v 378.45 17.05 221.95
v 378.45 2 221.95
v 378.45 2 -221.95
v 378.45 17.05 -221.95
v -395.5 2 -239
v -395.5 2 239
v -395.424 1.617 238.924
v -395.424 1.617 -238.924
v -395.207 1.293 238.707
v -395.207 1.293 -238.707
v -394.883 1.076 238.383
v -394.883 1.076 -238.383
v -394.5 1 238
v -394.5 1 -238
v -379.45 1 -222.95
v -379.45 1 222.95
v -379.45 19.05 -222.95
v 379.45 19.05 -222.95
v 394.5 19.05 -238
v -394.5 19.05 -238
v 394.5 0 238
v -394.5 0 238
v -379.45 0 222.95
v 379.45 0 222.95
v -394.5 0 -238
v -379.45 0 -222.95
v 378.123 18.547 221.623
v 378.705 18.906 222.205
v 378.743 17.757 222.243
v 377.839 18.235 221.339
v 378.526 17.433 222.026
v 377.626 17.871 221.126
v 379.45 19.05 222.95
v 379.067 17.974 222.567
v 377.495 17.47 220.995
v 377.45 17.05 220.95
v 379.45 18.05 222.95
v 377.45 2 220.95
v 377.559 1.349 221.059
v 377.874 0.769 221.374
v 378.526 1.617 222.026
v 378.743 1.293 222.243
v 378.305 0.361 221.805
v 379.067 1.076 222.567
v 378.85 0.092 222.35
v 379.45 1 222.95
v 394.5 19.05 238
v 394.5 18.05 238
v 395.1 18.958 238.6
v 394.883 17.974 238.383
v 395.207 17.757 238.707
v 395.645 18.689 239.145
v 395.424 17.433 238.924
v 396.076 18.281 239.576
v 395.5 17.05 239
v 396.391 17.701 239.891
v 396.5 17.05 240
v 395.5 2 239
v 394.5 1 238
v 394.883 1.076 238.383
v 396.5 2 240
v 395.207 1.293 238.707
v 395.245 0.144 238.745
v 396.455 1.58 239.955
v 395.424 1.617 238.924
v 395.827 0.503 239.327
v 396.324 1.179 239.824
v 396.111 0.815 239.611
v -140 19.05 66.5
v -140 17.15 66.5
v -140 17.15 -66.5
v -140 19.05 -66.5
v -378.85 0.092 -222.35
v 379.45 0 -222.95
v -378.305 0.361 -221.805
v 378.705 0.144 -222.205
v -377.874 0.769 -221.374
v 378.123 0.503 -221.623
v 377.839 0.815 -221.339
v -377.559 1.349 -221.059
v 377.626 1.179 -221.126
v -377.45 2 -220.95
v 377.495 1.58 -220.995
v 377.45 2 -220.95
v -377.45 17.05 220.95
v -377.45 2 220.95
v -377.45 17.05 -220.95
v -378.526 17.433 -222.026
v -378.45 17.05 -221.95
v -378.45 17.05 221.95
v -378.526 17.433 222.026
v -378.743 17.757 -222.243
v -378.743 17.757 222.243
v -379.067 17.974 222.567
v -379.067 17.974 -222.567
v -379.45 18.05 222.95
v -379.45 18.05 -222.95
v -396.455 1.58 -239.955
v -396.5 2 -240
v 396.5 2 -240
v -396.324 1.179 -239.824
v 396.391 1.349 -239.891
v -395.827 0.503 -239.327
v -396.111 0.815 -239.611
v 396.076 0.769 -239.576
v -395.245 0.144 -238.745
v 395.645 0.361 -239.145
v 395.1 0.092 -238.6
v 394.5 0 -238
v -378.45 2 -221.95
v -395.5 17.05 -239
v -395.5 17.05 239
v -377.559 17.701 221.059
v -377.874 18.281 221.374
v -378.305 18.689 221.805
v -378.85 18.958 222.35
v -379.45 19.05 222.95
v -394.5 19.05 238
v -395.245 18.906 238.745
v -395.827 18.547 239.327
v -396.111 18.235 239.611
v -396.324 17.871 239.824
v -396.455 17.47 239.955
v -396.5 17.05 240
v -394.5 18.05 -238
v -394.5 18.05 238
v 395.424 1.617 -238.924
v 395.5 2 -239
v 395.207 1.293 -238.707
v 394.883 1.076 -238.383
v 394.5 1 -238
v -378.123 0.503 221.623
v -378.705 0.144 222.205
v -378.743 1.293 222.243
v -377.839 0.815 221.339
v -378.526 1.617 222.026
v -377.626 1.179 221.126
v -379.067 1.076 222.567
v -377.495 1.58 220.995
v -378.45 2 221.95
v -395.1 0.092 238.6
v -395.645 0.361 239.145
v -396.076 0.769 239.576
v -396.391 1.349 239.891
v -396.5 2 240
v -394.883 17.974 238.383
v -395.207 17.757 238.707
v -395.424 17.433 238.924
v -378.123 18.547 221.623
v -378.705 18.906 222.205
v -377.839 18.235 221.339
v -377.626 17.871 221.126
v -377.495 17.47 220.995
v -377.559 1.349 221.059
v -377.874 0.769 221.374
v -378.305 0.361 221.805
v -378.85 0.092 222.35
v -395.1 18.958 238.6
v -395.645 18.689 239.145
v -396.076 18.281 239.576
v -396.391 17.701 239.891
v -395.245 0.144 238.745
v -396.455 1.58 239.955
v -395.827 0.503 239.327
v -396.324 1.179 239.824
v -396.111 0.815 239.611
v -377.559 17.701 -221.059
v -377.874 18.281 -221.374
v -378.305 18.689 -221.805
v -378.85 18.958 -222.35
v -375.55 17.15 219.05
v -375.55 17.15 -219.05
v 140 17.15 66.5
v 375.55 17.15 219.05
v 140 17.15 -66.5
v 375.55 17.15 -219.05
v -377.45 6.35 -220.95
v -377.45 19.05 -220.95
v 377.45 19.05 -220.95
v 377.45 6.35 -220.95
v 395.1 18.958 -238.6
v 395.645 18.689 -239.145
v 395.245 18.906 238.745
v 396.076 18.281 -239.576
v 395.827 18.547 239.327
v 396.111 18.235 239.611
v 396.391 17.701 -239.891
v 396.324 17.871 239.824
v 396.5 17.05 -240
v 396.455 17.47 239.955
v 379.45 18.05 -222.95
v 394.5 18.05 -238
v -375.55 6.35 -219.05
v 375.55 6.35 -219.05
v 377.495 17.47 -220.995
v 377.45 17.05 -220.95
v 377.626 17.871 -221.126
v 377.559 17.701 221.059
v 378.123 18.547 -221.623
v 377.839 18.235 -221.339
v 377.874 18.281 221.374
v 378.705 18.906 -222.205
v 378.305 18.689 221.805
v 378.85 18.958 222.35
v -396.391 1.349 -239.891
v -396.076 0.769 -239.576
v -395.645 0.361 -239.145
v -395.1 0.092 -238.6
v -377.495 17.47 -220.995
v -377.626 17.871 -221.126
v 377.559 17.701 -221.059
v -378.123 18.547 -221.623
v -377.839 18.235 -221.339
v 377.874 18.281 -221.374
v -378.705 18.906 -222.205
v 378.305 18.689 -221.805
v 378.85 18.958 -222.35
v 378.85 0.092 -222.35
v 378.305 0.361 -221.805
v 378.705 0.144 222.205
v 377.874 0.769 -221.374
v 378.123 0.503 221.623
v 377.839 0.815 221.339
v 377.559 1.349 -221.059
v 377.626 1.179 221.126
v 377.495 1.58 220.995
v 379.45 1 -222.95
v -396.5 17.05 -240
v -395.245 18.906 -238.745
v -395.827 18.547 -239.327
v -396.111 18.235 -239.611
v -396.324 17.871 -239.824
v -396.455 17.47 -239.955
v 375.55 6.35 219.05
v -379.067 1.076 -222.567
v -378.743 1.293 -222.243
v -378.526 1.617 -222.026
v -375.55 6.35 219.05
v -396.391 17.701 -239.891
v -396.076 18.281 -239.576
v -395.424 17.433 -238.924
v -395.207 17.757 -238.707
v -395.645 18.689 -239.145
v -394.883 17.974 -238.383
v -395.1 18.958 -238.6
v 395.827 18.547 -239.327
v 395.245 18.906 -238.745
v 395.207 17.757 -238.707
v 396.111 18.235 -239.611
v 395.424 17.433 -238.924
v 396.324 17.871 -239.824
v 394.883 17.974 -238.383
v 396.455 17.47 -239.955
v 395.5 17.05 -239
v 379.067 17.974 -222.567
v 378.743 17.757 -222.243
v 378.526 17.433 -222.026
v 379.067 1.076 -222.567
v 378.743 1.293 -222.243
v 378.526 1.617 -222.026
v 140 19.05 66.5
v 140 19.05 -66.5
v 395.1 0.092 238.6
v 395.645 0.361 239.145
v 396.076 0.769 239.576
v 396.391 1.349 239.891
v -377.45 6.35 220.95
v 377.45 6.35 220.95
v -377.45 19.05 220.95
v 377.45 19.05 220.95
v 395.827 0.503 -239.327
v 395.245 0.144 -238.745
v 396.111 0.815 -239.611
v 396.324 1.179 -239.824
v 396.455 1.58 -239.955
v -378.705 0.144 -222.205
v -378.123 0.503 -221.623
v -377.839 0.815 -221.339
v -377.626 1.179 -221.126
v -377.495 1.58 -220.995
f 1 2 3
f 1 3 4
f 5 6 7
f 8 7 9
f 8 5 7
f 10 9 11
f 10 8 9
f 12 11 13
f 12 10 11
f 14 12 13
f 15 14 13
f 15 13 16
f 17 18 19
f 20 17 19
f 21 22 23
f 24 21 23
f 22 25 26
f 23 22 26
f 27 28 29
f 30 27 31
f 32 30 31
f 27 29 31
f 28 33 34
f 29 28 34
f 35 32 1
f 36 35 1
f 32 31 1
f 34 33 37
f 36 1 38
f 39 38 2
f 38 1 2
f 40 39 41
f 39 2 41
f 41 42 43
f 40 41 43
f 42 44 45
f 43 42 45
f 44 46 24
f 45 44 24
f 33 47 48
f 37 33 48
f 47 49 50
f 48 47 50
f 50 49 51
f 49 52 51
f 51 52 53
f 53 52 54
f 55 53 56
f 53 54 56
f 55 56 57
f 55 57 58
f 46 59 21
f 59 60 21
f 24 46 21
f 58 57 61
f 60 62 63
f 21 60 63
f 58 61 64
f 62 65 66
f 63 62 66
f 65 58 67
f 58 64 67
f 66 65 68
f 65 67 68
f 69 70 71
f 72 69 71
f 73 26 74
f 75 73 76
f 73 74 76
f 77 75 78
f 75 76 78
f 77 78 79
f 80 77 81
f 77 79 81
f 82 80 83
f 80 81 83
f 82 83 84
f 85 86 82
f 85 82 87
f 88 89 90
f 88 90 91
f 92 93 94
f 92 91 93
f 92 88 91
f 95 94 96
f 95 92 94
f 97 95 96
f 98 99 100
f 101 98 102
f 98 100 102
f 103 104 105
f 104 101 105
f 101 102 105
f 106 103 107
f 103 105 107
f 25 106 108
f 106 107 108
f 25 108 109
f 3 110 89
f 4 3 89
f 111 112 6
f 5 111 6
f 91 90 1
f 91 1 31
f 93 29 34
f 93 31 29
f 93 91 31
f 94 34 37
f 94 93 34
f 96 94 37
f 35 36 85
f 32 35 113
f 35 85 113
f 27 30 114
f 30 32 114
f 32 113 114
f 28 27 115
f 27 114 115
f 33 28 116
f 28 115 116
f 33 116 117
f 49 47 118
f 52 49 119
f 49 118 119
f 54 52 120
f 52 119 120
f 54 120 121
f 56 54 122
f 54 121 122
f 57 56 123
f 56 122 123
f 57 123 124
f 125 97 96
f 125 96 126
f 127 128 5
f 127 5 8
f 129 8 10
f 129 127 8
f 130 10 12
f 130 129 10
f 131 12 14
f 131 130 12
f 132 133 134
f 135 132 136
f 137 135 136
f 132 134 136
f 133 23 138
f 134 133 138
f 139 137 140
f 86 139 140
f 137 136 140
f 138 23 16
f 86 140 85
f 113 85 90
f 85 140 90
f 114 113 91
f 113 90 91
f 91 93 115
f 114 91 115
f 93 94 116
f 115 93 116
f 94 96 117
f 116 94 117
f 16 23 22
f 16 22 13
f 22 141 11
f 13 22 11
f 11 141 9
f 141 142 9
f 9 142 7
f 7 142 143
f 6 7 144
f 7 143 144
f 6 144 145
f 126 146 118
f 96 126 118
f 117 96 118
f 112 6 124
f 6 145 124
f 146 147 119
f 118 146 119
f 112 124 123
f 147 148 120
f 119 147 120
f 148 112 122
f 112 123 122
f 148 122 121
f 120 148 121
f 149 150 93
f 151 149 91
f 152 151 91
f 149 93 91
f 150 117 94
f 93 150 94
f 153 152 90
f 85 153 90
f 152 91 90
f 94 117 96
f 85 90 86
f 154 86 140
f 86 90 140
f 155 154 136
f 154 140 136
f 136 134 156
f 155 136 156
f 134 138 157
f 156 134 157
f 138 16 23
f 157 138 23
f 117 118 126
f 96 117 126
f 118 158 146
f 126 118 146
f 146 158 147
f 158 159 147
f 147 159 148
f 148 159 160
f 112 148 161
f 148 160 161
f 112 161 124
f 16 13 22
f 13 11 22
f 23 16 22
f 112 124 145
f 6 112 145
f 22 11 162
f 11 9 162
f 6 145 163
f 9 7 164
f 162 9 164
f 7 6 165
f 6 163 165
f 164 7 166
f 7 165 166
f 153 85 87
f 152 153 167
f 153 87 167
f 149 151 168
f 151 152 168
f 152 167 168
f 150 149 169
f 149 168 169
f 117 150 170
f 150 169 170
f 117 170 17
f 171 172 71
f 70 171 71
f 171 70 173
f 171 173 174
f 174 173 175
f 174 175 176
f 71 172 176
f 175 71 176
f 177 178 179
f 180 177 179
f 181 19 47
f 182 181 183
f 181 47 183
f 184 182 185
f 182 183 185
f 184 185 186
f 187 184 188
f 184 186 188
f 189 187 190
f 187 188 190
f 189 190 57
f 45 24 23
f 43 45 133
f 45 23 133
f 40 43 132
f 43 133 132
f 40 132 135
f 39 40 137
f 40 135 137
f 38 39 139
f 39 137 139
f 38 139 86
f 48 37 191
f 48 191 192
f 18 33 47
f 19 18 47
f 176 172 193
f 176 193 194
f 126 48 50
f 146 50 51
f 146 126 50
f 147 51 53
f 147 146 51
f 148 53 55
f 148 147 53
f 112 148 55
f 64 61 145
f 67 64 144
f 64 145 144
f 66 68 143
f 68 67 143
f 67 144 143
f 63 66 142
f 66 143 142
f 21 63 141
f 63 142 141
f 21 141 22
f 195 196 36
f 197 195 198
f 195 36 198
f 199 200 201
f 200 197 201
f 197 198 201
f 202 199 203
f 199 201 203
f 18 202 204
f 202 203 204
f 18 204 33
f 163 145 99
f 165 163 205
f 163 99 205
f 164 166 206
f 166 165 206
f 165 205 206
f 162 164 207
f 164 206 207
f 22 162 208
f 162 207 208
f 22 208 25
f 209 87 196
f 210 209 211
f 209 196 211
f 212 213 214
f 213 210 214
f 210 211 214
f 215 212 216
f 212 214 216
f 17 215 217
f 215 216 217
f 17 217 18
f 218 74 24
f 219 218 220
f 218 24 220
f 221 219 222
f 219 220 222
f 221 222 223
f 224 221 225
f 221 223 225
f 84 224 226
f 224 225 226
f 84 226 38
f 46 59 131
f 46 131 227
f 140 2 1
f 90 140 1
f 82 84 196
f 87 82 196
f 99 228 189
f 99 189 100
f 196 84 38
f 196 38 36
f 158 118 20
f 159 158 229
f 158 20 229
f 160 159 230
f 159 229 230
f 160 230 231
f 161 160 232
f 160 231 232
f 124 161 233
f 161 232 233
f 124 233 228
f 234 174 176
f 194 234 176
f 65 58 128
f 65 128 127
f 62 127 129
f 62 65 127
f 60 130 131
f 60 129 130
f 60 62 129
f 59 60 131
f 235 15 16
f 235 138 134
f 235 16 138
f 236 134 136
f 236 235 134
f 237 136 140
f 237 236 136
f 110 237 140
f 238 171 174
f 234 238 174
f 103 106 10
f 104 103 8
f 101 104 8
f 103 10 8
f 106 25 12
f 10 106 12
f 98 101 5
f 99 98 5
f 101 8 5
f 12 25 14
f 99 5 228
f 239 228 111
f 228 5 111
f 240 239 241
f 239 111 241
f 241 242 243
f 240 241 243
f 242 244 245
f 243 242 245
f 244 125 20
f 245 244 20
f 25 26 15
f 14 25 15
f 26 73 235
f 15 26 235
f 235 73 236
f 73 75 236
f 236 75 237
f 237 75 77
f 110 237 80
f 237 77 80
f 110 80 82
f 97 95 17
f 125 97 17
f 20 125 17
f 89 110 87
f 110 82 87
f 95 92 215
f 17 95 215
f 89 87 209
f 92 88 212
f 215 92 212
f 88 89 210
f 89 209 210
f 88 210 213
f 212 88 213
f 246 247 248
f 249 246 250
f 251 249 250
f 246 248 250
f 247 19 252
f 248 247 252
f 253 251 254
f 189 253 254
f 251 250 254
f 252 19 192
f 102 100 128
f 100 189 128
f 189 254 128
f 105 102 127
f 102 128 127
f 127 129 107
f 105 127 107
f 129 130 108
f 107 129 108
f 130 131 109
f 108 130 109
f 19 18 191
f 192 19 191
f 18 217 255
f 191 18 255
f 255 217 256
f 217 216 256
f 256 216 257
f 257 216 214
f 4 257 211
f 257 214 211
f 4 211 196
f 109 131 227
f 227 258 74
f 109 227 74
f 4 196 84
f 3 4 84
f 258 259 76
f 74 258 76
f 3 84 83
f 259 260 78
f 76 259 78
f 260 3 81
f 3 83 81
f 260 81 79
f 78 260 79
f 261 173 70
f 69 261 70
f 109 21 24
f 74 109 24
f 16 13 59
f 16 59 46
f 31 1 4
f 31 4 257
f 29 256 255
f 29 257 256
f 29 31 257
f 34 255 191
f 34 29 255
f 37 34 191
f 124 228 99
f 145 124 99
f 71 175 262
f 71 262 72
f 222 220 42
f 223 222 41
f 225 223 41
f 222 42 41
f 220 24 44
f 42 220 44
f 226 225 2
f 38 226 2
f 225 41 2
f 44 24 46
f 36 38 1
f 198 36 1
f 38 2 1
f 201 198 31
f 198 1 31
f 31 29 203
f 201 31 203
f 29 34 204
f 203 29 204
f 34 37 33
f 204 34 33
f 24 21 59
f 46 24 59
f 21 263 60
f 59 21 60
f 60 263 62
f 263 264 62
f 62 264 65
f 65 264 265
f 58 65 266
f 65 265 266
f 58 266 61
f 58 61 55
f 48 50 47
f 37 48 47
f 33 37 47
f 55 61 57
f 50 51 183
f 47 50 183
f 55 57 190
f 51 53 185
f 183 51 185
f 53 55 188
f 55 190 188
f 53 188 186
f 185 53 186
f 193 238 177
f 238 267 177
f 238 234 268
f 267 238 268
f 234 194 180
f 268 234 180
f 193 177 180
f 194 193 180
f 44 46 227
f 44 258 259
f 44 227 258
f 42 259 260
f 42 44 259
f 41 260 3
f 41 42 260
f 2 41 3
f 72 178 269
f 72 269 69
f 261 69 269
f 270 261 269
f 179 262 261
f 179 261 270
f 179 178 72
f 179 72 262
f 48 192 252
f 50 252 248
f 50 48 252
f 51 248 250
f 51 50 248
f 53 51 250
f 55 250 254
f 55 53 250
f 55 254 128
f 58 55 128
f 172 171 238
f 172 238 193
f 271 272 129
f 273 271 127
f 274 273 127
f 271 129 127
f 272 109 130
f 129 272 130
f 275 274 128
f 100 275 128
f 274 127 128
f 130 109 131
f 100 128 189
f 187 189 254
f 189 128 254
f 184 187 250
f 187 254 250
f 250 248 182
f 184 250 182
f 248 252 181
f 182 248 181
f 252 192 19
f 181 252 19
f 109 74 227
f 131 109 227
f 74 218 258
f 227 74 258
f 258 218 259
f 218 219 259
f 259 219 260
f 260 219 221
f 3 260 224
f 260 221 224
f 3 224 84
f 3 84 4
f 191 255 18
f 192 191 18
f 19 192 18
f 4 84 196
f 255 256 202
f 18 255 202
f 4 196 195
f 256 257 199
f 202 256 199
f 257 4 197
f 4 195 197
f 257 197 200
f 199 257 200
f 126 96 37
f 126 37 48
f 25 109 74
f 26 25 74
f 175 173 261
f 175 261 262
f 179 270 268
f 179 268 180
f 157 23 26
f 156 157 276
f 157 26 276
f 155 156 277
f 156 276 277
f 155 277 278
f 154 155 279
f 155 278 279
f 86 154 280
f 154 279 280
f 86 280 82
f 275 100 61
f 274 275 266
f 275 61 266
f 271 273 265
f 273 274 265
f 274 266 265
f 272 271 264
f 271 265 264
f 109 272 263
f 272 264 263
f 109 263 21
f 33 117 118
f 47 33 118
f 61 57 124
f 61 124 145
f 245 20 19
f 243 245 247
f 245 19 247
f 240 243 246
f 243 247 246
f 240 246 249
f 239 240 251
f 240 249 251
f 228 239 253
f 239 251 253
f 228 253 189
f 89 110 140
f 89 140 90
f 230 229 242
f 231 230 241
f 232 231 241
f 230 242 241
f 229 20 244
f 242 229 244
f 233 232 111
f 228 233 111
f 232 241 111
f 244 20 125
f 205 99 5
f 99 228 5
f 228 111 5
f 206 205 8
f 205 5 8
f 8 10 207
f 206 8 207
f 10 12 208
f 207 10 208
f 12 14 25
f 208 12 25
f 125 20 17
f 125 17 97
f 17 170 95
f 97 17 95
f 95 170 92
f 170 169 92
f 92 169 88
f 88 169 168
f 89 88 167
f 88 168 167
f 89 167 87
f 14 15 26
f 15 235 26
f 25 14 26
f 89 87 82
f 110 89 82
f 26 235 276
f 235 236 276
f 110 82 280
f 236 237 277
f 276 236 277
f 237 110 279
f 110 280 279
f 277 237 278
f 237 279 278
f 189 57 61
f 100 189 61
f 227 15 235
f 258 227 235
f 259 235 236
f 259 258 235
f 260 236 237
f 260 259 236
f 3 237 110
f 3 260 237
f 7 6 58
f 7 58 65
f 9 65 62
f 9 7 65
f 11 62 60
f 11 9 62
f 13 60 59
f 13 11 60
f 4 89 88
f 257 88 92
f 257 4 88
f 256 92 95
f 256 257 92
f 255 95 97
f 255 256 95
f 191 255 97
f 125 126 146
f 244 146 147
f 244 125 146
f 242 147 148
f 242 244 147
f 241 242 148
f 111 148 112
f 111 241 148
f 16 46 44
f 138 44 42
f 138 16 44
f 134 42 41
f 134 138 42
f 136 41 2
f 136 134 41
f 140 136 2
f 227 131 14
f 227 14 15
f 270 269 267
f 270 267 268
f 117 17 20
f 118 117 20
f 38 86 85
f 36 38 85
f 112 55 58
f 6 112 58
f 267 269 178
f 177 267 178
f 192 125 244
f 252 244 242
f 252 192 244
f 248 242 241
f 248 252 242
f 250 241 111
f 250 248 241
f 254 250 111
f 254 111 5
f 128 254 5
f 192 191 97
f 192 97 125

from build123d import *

# Parameters (mm, degrees)
TUBO_CUADRADO_2_X_2_X_0_25_1_DEPTH      = 507.940768363
TUBO_CUADRADO_2_X_2_X_0_25_1_DEPTH_BACK = 27.940768363
TUBO_CUADRADO_2_X_2_X_0_25_1_2_DEPTH    = 848.881536726
TUBO_CUADRADO_2_X_2_X_0_25_1_3_DEPTH    = 535.881536726
TUBO_CUADRADO_2_X_2_X_0_25_1_4_DEPTH    = 848.881536726
CROQUIS2_W                              = 754.9
CROQUIS2_H                              = 441.9
SALIENTE_EXTRUIR1_DEPTH                 = 12.7
VACIADO1_T                              = -1.9
CROQUIS3_W                              = 280
CROQUIS3_H                              = 133
CORTAR_EXTRUIR1_DEPTH                   = 10


with BuildPart() as part:
    # Sketch1 → Tubo cuadrado 2 X 2 X 0.25(1) (new, two sides: drawn at the far end of the back side and taken through both)
    with BuildSketch(Plane(origin=(-386.975, 9.525, -240), x_dir=(1, 0, 0), z_dir=(0, 0, 1)).offset(-TUBO_CUADRADO_2_X_2_X_0_25_1_DEPTH_BACK)):
        with BuildLine():
            Line((-7.525, -9.525), (7.525, -9.525))
            ThreePointArc((7.525, -9.525), (8.939213562, -8.939213562), (9.525, -7.525))
            Line((9.525, -7.525), (9.525, 7.525))
            ThreePointArc((9.525, 7.525), (8.939213562, 8.939213562), (7.525, 9.525))
            Line((7.525, 9.525), (-7.525, 9.525))
            ThreePointArc((-7.525, 9.525), (-8.939213562, 8.939213562), (-9.525, 7.525))
            Line((-9.525, 7.525), (-9.525, -7.525))
            ThreePointArc((-9.525, -7.525), (-8.939213562, -8.939213562), (-7.525, -9.525))
        make_face()
        with BuildLine():
            Line((-7.525, -8.525), (7.525, -8.525))
            ThreePointArc((7.525, -8.525), (8.232106781, -8.232106781), (8.525, -7.525))
            Line((8.525, -7.525), (8.525, 7.525))
            ThreePointArc((8.525, 7.525), (8.232106781, 8.232106781), (7.525, 8.525))
            Line((7.525, 8.525), (-7.525, 8.525))
            ThreePointArc((-7.525, 8.525), (-8.232106781, 8.232106781), (-8.525, 7.525))
            Line((-8.525, 7.525), (-8.525, -7.525))
            ThreePointArc((-8.525, -7.525), (-8.232106781, -8.232106781), (-7.525, -8.525))
        make_face(mode=Mode.SUBTRACT)
    extrude(amount=TUBO_CUADRADO_2_X_2_X_0_25_1_DEPTH + TUBO_CUADRADO_2_X_2_X_0_25_1_DEPTH_BACK)

    # Tubo cuadrado 2 X 2 X 0.25(1) mitre 1
    split(bisect_by=Plane(origin=(-396.5, 0, -240), x_dir=(0, -1, 0), z_dir=(-0.707106781, 0, 0.707106781)), keep=Keep.TOP)

    # Tubo cuadrado 2 X 2 X 0.25(1) mitre 2
    split(bisect_by=Plane(origin=(-396.5, 0, 240), x_dir=(0, -1, 0), z_dir=(-0.707106781, 0, -0.707106781)), keep=Keep.TOP)


with BuildPart() as body_2:
    # Sketch1 on segment 2 (carried to segment 2) → Tubo cuadrado 2 X 2 X 0.25_1 2 (new body)
    with BuildSketch(Plane(origin=(-424.440768363, 9.525, 230.475), x_dir=(0, 0, -1), z_dir=(1, 0, 0))):
        with BuildLine():
            Line((-7.525, -9.525), (7.525, -9.525))
            ThreePointArc((7.525, -9.525), (8.939213562, -8.939213562), (9.525, -7.525))
            Line((9.525, -7.525), (9.525, 7.525))
            ThreePointArc((9.525, 7.525), (8.939213562, 8.939213562), (7.525, 9.525))
            Line((7.525, 9.525), (-7.525, 9.525))
            ThreePointArc((-7.525, 9.525), (-8.939213562, 8.939213562), (-9.525, 7.525))
            Line((-9.525, 7.525), (-9.525, -7.525))
            ThreePointArc((-9.525, -7.525), (-8.939213562, -8.939213562), (-7.525, -9.525))
        make_face()
        with BuildLine():
            Line((-7.525, -8.525), (7.525, -8.525))
            ThreePointArc((7.525, -8.525), (8.232106781, -8.232106781), (8.525, -7.525))
            Line((8.525, -7.525), (8.525, 7.525))
            ThreePointArc((8.525, 7.525), (8.232106781, 8.232106781), (7.525, 8.525))
            Line((7.525, 8.525), (-7.525, 8.525))
            ThreePointArc((-7.525, 8.525), (-8.232106781, 8.232106781), (-8.525, 7.525))
            Line((-8.525, 7.525), (-8.525, -7.525))
            ThreePointArc((-8.525, -7.525), (-8.232106781, -8.232106781), (-7.525, -8.525))
        make_face(mode=Mode.SUBTRACT)
    extrude(amount=TUBO_CUADRADO_2_X_2_X_0_25_1_2_DEPTH)

    # Tubo cuadrado 2 X 2 X 0.25_1 2 mitre 1
    split(bisect_by=Plane(origin=(-396.5, 0, 240), x_dir=(0, 1, 0), z_dir=(0.707106781, 0, 0.707106781)), keep=Keep.TOP)

    # Tubo cuadrado 2 X 2 X 0.25_1 2 mitre 2
    split(bisect_by=Plane(origin=(396.5, 0, 240), x_dir=(0, -1, 0), z_dir=(-0.707106781, 0, 0.707106781)), keep=Keep.TOP)


with BuildPart() as body_3:
    # Sketch1 on segment 3 (carried to segment 3) → Tubo cuadrado 2 X 2 X 0.25_1 3 (new body)
    with BuildSketch(Plane(origin=(386.975, 9.525, 267.940768363), x_dir=(-1, 0, 0), z_dir=(0, 0, -1))):
        with BuildLine():
            Line((-7.525, -9.525), (7.525, -9.525))
            ThreePointArc((7.525, -9.525), (8.939213562, -8.939213562), (9.525, -7.525))
            Line((9.525, -7.525), (9.525, 7.525))
            ThreePointArc((9.525, 7.525), (8.939213562, 8.939213562), (7.525, 9.525))
            Line((7.525, 9.525), (-7.525, 9.525))
            ThreePointArc((-7.525, 9.525), (-8.939213562, 8.939213562), (-9.525, 7.525))
            Line((-9.525, 7.525), (-9.525, -7.525))
            ThreePointArc((-9.525, -7.525), (-8.939213562, -8.939213562), (-7.525, -9.525))
        make_face()
        with BuildLine():
            Line((-7.525, -8.525), (7.525, -8.525))
            ThreePointArc((7.525, -8.525), (8.232106781, -8.232106781), (8.525, -7.525))
            Line((8.525, -7.525), (8.525, 7.525))
            ThreePointArc((8.525, 7.525), (8.232106781, 8.232106781), (7.525, 8.525))
            Line((7.525, 8.525), (-7.525, 8.525))
            ThreePointArc((-7.525, 8.525), (-8.232106781, 8.232106781), (-8.525, 7.525))
            Line((-8.525, 7.525), (-8.525, -7.525))
            ThreePointArc((-8.525, -7.525), (-8.232106781, -8.232106781), (-7.525, -8.525))
        make_face(mode=Mode.SUBTRACT)
    extrude(amount=TUBO_CUADRADO_2_X_2_X_0_25_1_3_DEPTH)

    # Tubo cuadrado 2 X 2 X 0.25_1 3 mitre 1
    split(bisect_by=Plane(origin=(396.5, 0, -240), x_dir=(0, 1, 0), z_dir=(0.707106781, 0, 0.707106781)), keep=Keep.TOP)

    # Tubo cuadrado 2 X 2 X 0.25_1 3 mitre 2
    split(bisect_by=Plane(origin=(396.5, 0, 240), x_dir=(0, 1, 0), z_dir=(0.707106781, 0, -0.707106781)), keep=Keep.TOP)


with BuildPart() as body_4:
    # Sketch1 on segment 4 (carried to segment 4) → Tubo cuadrado 2 X 2 X 0.25_1 4 (new body)
    with BuildSketch(Plane(origin=(424.440768363, 9.525, -230.475), x_dir=(0, 0, 1), z_dir=(-1, 0, 0))):
        with BuildLine():
            Line((-7.525, -9.525), (7.525, -9.525))
            ThreePointArc((7.525, -9.525), (8.939213562, -8.939213562), (9.525, -7.525))
            Line((9.525, -7.525), (9.525, 7.525))
            ThreePointArc((9.525, 7.525), (8.939213562, 8.939213562), (7.525, 9.525))
            Line((7.525, 9.525), (-7.525, 9.525))
            ThreePointArc((-7.525, 9.525), (-8.939213562, 8.939213562), (-9.525, 7.525))
            Line((-9.525, 7.525), (-9.525, -7.525))
            ThreePointArc((-9.525, -7.525), (-8.939213562, -8.939213562), (-7.525, -9.525))
        make_face()
        with BuildLine():
            Line((-7.525, -8.525), (7.525, -8.525))
            ThreePointArc((7.525, -8.525), (8.232106781, -8.232106781), (8.525, -7.525))
            Line((8.525, -7.525), (8.525, 7.525))
            ThreePointArc((8.525, 7.525), (8.232106781, 8.232106781), (7.525, 8.525))
            Line((7.525, 8.525), (-7.525, 8.525))
            ThreePointArc((-7.525, 8.525), (-8.232106781, 8.232106781), (-8.525, 7.525))
            Line((-8.525, 7.525), (-8.525, -7.525))
            ThreePointArc((-8.525, -7.525), (-8.232106781, -8.232106781), (-7.525, -8.525))
        make_face(mode=Mode.SUBTRACT)
    extrude(amount=TUBO_CUADRADO_2_X_2_X_0_25_1_4_DEPTH)

    # Tubo cuadrado 2 X 2 X 0.25_1 4 mitre 1
    split(bisect_by=Plane(origin=(-396.5, 0, -240), x_dir=(0, 1, 0), z_dir=(0.707106781, 0, -0.707106781)), keep=Keep.TOP)

    # Tubo cuadrado 2 X 2 X 0.25_1 4 mitre 2
    split(bisect_by=Plane(origin=(396.5, 0, -240), x_dir=(0, -1, 0), z_dir=(-0.707106781, 0, -0.707106781)), keep=Keep.TOP)


with BuildPart() as body_5:
    # Croquis2 → Saliente-Extruir1 (new body)
    with BuildSketch(Plane(origin=(0, 19.05, 0), x_dir=(1, 0, 0), z_dir=(0, 1, 0))):
        Rectangle(CROQUIS2_W, CROQUIS2_H)
    extrude(amount=-SALIENTE_EXTRUIR1_DEPTH)

    # Vaciado1
    vaciado1_openings = [body_5.faces().sort_by_distance(p)[0] for p in [
        (0, 6.35, 0),
    ]]
    offset(amount=VACIADO1_T, openings=vaciado1_openings, kind=Kind.INTERSECTION)

    # Croquis3 → Cortar-Extruir1 (cut)
    with BuildSketch(Plane(origin=(0, 17.15, 0), x_dir=(-1, 0, 0), z_dir=(0, -1, 0))):
        Rectangle(CROQUIS3_W, CROQUIS3_H)
    extrude(amount=-CORTAR_EXTRUIR1_DEPTH, mode=Mode.SUBTRACT)


solid = Compound([part.part, body_2.part, body_3.part, body_4.part, body_5.part])
